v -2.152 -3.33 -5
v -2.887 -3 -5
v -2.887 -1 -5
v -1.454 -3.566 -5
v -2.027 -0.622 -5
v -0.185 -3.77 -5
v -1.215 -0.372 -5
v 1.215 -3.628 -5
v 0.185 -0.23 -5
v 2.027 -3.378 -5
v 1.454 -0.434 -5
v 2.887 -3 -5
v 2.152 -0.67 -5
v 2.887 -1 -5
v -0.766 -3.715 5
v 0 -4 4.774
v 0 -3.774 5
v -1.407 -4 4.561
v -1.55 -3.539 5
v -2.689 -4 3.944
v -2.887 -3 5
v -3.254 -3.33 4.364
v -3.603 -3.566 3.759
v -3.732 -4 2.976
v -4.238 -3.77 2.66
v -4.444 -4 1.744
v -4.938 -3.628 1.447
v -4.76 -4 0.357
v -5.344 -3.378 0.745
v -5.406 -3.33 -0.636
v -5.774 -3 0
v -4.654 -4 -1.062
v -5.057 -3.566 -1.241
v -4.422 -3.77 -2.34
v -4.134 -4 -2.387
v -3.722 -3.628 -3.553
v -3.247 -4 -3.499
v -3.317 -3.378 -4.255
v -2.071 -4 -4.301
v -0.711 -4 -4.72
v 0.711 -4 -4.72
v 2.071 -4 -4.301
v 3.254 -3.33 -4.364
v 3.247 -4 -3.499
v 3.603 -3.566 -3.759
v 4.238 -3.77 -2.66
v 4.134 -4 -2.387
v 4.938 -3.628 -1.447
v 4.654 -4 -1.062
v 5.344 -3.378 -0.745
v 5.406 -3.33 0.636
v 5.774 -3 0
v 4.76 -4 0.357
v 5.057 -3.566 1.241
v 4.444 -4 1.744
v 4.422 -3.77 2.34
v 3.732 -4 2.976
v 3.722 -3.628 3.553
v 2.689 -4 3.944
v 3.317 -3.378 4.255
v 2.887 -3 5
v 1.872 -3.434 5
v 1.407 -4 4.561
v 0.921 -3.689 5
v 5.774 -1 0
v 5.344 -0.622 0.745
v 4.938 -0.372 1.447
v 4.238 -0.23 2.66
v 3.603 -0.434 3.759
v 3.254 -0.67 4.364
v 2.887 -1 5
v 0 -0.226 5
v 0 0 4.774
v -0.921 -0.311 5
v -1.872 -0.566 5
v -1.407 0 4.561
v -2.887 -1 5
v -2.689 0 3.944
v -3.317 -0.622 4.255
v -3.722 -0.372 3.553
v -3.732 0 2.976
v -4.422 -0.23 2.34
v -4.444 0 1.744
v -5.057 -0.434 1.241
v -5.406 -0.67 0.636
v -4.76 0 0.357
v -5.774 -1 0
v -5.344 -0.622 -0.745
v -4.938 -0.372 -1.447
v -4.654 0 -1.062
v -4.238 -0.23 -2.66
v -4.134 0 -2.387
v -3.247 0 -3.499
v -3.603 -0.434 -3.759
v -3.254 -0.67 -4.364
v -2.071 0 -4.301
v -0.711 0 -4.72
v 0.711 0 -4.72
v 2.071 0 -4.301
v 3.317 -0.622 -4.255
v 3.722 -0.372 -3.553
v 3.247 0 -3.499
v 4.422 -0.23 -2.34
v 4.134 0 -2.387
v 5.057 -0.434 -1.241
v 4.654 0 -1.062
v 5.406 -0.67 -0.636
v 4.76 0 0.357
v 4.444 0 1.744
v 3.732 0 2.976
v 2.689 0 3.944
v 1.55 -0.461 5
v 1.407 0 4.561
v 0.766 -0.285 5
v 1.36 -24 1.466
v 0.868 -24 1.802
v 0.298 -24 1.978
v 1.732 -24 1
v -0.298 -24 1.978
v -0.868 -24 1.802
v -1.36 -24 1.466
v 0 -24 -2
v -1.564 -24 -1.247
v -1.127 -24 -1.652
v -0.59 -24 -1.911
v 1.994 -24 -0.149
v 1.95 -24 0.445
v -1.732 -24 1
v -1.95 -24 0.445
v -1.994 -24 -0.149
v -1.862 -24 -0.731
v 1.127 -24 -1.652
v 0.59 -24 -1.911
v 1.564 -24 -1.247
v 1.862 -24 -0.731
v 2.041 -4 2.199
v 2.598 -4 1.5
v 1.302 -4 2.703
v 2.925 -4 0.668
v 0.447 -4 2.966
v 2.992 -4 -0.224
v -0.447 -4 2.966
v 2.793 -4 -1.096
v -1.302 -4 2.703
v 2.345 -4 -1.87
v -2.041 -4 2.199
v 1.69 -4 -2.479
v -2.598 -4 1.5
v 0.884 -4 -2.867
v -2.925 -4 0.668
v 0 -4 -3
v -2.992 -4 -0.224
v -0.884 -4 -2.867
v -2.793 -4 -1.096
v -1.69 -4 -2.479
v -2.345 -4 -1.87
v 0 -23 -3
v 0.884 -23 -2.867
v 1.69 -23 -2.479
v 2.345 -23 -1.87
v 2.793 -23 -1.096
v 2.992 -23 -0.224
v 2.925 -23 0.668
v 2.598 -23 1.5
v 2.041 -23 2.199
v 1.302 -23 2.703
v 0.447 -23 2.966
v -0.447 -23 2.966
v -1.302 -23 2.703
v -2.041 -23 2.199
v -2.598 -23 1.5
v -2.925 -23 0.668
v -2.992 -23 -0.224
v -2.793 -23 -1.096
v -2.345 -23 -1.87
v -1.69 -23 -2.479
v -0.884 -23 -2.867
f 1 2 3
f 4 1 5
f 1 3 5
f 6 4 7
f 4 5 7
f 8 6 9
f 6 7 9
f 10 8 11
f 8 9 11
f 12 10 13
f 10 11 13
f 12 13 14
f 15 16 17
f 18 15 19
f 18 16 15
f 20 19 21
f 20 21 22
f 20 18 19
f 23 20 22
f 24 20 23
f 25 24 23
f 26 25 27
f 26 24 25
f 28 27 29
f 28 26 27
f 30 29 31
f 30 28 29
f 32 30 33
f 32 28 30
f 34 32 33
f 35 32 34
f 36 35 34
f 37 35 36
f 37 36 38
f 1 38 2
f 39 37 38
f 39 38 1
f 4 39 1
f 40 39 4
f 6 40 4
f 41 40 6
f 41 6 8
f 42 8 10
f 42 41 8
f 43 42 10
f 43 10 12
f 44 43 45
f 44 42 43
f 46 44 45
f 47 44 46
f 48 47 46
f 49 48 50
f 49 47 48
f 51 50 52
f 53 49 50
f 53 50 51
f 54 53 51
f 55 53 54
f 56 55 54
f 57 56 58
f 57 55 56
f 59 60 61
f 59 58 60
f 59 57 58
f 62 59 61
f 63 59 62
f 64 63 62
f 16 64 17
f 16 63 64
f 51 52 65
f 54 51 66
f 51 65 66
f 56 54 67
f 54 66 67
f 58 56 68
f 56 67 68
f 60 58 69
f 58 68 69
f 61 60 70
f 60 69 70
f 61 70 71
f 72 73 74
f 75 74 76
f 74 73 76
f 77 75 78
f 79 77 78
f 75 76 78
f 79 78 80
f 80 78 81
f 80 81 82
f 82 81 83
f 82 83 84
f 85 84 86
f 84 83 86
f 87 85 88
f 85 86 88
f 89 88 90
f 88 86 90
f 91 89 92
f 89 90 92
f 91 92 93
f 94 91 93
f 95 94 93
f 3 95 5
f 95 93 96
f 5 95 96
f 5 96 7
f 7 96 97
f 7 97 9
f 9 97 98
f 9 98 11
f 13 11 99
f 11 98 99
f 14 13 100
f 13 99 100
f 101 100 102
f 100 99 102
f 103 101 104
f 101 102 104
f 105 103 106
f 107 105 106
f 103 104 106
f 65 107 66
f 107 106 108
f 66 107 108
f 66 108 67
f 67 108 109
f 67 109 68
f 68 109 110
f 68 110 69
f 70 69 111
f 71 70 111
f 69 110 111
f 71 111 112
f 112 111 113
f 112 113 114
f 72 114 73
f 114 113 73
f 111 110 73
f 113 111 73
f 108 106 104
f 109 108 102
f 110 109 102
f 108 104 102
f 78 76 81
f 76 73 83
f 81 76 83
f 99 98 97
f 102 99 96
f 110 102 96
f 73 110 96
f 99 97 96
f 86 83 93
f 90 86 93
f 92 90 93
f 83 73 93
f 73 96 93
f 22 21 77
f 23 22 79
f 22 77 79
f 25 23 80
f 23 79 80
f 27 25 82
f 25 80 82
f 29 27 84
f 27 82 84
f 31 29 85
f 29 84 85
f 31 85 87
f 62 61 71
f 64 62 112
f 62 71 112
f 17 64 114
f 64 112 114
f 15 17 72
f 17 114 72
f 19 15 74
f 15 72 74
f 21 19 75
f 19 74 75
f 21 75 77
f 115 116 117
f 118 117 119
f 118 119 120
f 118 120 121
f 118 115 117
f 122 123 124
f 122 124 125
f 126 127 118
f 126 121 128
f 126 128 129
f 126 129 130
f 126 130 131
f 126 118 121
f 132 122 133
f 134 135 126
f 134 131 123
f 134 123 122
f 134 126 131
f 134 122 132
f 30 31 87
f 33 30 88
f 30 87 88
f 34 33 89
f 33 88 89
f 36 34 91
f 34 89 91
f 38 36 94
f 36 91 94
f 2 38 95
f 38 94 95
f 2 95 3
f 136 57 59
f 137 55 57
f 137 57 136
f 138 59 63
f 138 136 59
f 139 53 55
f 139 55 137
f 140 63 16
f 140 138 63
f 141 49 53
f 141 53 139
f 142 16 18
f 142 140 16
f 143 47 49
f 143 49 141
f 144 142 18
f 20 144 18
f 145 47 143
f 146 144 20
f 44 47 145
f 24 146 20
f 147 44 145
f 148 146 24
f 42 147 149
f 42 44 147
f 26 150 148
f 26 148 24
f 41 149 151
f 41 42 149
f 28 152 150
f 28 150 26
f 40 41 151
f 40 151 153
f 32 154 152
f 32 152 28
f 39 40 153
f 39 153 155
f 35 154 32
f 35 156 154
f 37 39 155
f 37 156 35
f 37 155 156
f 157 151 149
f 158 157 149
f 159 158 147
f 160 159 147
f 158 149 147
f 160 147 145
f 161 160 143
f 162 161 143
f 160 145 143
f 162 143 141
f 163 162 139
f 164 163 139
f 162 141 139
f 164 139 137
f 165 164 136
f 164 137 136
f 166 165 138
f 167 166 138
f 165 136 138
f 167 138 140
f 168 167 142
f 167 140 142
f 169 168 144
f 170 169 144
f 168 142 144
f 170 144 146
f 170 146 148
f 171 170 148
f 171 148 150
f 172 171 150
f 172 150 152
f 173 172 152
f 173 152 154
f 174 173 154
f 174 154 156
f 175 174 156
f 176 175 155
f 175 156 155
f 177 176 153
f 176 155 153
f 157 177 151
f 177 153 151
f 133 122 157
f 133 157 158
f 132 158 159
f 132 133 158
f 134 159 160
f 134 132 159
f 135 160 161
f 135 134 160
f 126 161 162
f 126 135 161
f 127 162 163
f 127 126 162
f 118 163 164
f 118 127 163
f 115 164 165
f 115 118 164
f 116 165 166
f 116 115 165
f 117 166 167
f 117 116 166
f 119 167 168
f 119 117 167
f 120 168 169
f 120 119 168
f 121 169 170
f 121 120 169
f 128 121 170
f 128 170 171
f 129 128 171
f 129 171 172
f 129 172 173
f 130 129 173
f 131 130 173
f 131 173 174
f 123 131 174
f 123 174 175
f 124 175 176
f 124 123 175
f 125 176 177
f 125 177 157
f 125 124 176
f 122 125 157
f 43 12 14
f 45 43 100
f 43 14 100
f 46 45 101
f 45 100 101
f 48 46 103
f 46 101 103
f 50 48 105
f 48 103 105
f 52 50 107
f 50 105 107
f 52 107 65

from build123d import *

# Parameters (mm, degrees)
EXTRUDE_1_DEPTH = 4
SKETCH_2_R      = 3
EXTRUDE_2_DEPTH = 20
CHAMFER_2_SIZE  = 1


with BuildPart() as part:
    # Эскиз1 → Вытянуть1 (new body)
    with BuildSketch(Plane(origin=(0, 0, 0), x_dir=(1, 0, 0), z_dir=(0, 1, 0))):
        Polygon((-2.886751346, 5), (2.886751346, 5), (5.773502692, 0), (2.886751346, -5), (-2.886751346, -5), (-5.773502692, 0), align=None)
    extrude(amount=-EXTRUDE_1_DEPTH)

    # Эскиз2 → Вытянуть2 (add)
    with BuildSketch(Plane.XZ.offset(4)):
        with Locations(Location((0, 0, 0), (0, 0, 270))):
            Circle(SKETCH_2_R)
    extrude(amount=EXTRUDE_2_DEPTH)

    # Фаска2
    chamfer_2_edges = [part.edges().sort_by_distance(p)[0] for p in [
        (0, -24, 3),
    ]]
    chamfer(chamfer_2_edges, length=CHAMFER_2_SIZE)

    # Эскиз3 → Вырез-Повернуть1 (revolve, cut)
    with BuildSketch(Plane.XY, mode=Mode.PRIVATE) as cut_revolve_1_sk:
        Polygon((-5.773502692, -1), (-4.773502692, 0), (-5.773502692, 0), align=None)
        Polygon((-5.773502692, -3), (-4.773502692, -4), (-5.773502692, -4), align=None)
    revolve(cut_revolve_1_sk.sketch.rotate(Axis((0, -4, 0), (0, -1, 0)), 270), axis=Axis((0, -4, 0), (0, -1, 0)), mode=Mode.SUBTRACT)


solid = part.part
